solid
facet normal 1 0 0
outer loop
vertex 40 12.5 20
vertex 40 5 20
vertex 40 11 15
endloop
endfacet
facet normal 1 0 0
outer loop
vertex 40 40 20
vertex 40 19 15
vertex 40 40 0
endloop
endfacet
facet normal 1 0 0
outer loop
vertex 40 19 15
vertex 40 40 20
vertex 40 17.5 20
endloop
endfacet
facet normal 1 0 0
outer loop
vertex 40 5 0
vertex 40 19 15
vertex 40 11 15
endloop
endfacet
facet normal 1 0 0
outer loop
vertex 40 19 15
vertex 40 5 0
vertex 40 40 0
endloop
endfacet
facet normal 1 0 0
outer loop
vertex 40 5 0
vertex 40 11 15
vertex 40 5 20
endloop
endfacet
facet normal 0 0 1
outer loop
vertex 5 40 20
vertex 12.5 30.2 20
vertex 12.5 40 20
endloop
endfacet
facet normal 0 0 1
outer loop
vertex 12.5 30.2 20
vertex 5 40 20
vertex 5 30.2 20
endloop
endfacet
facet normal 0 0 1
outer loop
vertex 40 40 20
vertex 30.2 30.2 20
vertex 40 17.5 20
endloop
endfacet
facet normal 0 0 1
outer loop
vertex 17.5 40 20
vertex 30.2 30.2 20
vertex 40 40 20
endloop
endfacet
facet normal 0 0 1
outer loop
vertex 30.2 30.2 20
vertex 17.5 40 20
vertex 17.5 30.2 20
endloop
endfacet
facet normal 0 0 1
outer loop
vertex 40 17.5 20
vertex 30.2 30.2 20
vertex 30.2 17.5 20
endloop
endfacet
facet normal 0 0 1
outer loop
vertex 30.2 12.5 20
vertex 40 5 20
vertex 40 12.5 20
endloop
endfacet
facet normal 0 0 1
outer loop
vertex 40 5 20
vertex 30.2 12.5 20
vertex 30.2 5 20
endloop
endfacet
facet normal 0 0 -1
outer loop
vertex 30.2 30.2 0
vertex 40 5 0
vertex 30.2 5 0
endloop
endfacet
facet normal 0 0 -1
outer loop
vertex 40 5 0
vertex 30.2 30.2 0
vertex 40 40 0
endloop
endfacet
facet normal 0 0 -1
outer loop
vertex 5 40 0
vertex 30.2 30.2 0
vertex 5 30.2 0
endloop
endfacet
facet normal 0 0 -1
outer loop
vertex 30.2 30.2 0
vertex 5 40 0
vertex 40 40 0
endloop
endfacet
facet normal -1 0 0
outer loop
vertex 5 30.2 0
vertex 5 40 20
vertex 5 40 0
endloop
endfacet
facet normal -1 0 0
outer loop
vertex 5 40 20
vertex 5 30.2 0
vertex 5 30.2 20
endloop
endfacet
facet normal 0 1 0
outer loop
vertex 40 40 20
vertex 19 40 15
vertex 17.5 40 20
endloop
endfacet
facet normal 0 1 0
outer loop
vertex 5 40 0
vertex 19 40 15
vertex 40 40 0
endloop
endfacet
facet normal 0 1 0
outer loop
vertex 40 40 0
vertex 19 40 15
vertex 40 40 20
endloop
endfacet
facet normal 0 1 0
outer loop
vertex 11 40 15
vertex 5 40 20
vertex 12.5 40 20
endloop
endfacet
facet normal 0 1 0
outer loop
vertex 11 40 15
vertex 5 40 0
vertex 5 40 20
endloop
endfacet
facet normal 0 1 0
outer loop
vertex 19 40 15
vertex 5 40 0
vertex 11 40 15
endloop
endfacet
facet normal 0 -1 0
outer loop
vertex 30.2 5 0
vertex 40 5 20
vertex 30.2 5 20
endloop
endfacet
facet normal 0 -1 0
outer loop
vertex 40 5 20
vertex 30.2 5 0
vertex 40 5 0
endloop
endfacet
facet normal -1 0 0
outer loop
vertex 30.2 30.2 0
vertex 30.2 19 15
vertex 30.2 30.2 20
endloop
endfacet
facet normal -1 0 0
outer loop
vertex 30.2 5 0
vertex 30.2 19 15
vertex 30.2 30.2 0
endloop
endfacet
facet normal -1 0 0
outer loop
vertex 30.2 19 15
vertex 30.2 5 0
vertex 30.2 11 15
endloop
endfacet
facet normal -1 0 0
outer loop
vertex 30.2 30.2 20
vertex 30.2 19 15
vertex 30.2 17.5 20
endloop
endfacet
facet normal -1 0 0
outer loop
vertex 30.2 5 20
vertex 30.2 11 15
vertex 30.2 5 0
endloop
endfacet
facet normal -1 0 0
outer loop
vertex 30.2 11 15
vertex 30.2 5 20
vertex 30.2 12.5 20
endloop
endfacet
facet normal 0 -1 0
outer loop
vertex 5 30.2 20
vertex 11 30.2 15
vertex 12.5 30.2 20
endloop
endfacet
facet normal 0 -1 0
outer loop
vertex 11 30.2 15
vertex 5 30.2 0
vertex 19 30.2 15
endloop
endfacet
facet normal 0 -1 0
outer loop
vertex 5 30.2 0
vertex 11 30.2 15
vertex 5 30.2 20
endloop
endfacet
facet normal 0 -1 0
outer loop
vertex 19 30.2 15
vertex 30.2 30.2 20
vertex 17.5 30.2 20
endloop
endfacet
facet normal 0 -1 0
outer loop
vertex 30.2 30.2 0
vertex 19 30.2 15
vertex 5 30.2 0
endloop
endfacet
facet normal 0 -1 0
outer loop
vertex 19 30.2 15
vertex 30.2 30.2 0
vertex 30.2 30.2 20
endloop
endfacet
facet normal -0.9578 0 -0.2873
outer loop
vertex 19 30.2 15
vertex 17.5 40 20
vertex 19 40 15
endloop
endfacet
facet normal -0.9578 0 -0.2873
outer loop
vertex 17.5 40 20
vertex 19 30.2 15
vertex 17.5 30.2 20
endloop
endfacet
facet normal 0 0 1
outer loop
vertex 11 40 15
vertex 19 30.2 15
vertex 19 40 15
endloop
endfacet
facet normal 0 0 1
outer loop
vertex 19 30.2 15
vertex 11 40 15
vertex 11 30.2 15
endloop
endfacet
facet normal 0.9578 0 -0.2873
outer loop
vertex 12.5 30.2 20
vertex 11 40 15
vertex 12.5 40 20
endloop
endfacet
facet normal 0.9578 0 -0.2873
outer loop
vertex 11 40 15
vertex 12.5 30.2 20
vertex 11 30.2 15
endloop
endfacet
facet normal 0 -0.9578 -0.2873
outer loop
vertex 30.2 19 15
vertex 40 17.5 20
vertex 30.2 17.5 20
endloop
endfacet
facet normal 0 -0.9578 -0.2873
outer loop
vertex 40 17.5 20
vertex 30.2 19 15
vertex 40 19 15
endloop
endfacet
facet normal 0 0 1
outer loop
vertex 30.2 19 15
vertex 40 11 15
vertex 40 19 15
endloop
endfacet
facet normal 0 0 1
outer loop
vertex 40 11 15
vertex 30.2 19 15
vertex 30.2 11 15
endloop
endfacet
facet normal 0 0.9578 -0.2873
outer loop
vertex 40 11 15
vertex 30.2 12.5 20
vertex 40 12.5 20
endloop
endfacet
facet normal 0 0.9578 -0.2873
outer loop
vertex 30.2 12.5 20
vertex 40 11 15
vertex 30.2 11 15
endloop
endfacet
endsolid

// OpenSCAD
// file: ../../globals.scad
/*
Most things in this file is represented as one millimeter, so keep that in mind while changing things.
Some of the setting are not mm but at variables that you can set, such as 2*x=2x and you are setting what x is.
I will try to specify when things are variables and not exact measurements.
*/

// printer slop, used by snappy parts
slop = 0.15;

//Virindi settings
dovetail_male_width_scale = 0.98;
dovetail_male_height_scale = 0.91;

obj_leg = 30;
leg_length = 5.5;
small_number = 0.001;
metal_core_rode_global = 5;


///////////////// number of holes /////////////////////
z_hole_number = 8;
other_holes = 8;

///////////////// Pins /////////////////////

//pins that poke out
ball_size = 10;
pin_height = 20;
pin_diameter = 6;


//holes
hole_ball_size = ball_size;
hole_pin_height = pin_height;
hole_pin_diameter = pin_diameter;

///////////////// Z THINGS /////////////////////

berring_slot_width = 7.5;
berring_slot_depth = 6.5;
metal_core_rode = 5;

///////////////// X THINGS /////////////////////

//male dove tails
max_width=8;
min_width=5;
depth=5;
height=obj_leg/2;

//female dove tails, this is found on the y mounts
girl_max_width=11;
girl_min_width=5;
girl_depth=5;
girl_height=obj_leg;


///////////////// Y THINGS /////////////////////
/*
The Y is so normal that all of those global variables at the top should change all of the setting in it, this section is set her incase there are variables set in the future development of this project.
*/

// stepper
motor_side_length = 43.2;
motor_bolt_hole_distance = 31;
motor_center_hole = 23;
motor_shaft_dia = 5;
motor_shaft_hole_dia = 5+2*slop;

// bolts etc.
bolt_hole_dia = 3+2*slop;
bolt_head_hole_dia = 5.8;

m3_nut_side = 5.65;

// threaded rod
lifter_rod_diam = 9.86;
hole_threaded_rod = lifter_rod_diam+2*slop;
// file: ../../include.scad
use <globals.scad>

//////////////////      END SECTION       //////////////////

	module added_pins(){
		difference(){
			union(){
				translate([30/(15/4),obj_leg*leg_length,30/(15/4)]) pin();
				translate([30/(15/4)+14.5,obj_leg*leg_length,30/(15/4)+14]) pin();
			}
			union(){
							translate([30/(15/4)+13.5,obj_leg*leg_length-20,30/(15/4)+5])cube(size=[2,40,15]);
							translate([30/(15/4)+7.5,obj_leg*leg_length-20,30/(15/4)+15])rotate([0,90,0]) cube(size=[2,40,15]);	

							translate([30/(15/4)-1,obj_leg*leg_length-20,30/(15/4)-8])cube(size=[2,40,15]);
							translate([30/(15/4)-10,obj_leg*leg_length-20,30/(15/4)+1])rotate([0,90,0]) cube(size=[2,40,15]);
			}
		}
	}
	module taken_pins() {
		translate([30/(15/4)+14,obj_leg*leg_length-10,30/(15/4)]) mirror_pin();
		translate([30/(15/4),obj_leg*leg_length-10,30/(15/4)+15]) mirror_pin();
	}


//////////////////      OTHER STUFF       //////////////////

	module holes() {
		rotate([0,0,90]) for(y=[0:other_holes])
		translate([obj_leg+y*15,-15.5,7.5]) union() {
			translate([7.5,0,15]) hole_up();
			hole_down();
		}
	}
	module extend_holes() {
	module top(){
		rotate([0,0,90]) for(y=[0:other_holes+1])
		translate([(30/4)+y*15,-15.5,7.5]) union() {
			translate([7.5,0,15]) hole_up();
		}
	}
	module bottom(){
		rotate([0,0,90]) for(y=[0:other_holes+2])
		translate([(30/4)+y*15,-15.5,7.5]) union() {
			hole_down();
		
}
	}
	union(){
		top();
		bottom();
	}
	}

	module hole() {
		union() {
			rotate([90, 90, 0]) cylinder(h=40, d=hole_pin_diameter, center=true);
			translate([0,7.5,0]) sphere(d=hole_ball_size);
			translate([0,-6,0]) sphere(d=hole_ball_size);
		}
	}
	module hole_up() {
		union() {
			rotate([90, 90, 0]) cylinder(h=40, d=hole_pin_diameter, center=true);
			translate([0,7.5,10]) cylinder(h=hole_pin_height, d=hole_pin_diameter, center=true);
			translate([0,-6,10]) cylinder(h=hole_pin_height, d=hole_pin_diameter, center=true);
			translate([0,7.5,0]) sphere(d=hole_ball_size);
			translate([0,-6,0]) sphere(d=hole_ball_size);
		}
	}
	module hole_down() {
		union() {
			rotate([90, 90, 0]) cylinder(h=40, d=hole_pin_diameter, center=true);
			translate([0,7.5,-10]) cylinder(h=hole_pin_height, d=hole_pin_diameter, center=true);
			translate([0,-6,-10]) cylinder(h=hole_pin_height, d=hole_pin_diameter, center=true);
			translate([0,7.5,0]) sphere(d=hole_ball_size);
			translate([0,-6,0]) sphere(d=hole_ball_size);
		}
	}
	module pin() {
		union() {
			rotate([90, 90, 0]) cylinder(h=pin_height, d=pin_diameter, center=true);
			translate([0,7.5,0]) sphere(d=ball_size);
		}
	}

	module mirror_pin() {
		rotate([90, 90, 0]) cylinder(h=hole_pin_height+small_number, d=hole_pin_diameter, center=true);
		translate([0,-(pin_height-(ball_size/2)),0]) sphere(d=ball_size);
	}


//////////////////      SOME RACK AND Z THINGS       //////////////////

module z_holes() {
    rotate([0,-90,0]) for(z=[0:z_hole_number])
    translate([22.5+z*15,16,-12])
        hole();
}

module pin_cuts() {
	union(){
		cube(size=[2,10,40], center=true);
		rotate([0,0,90]) cube(size=[2,10,40], center=true);
	}
}
module pin_uncut() {
	union(){
		rotate([0, 0, 90]) cylinder(h=hole_pin_height, d=hole_pin_diameter, center=true);
		translate([0,0,10]) sphere(d=ball_hole);
	}
}


module pin_out() {
	union(){
		rotate([0, 0, 90]) cylinder(h=pin_height, d=pin_diameter, center=true);
		translate([0,0,10]) sphere(d= ball_size);
	}
}


module pins_z(){
	difference() {
		pin_out();
		pin_cuts();
	}
}

module rounded_cube(width,depth,height){
    hull(){
        translate([width/2-diameter/2,depth/2-diameter/2,height/2-diameter/2]) sphere(d=diameter);
        translate([width/2-(diameter/2),depth/2-(diameter/2),-height/2+(diameter/2)]) sphere(d=diameter);
        translate([-width/2+diameter/2,depth/2-diameter/2,height/2-diameter/2]) sphere(d=diameter);
        translate([-width/2+(diameter/2),depth/2-(diameter/2),-height/2+(diameter/2)]) sphere(d=diameter);
        
        translate([width/2-diameter/2,-depth/2+diameter/2,height/2-diameter/2]) sphere(d=diameter);
        translate([width/2-(diameter/2),-depth/2+(diameter/2),-height/2+(diameter/2)]) sphere(d=diameter);
        translate([-width/2+diameter/2,-depth/2+diameter/2,height/2-diameter/2]) sphere(d=diameter);
        translate([-width/2+(diameter/2),-depth/2+(diameter/2),-height/2+(diameter/2)]) sphere(d=diameter);
    }
}

module motor_shaft_hole(h=10) {
    difference() {
        cylinder(d=motor_shaft_hole_dia, h=h);
        translate([0,4.5,h/2]) cube([5,5,h], center=true); 
    }
}
//////////////////      RACK AND SLIDE     ///////////////////

module straight_pins() {
	for(z=[0:((((obj_leg*leg_length)*2)-(obj_leg*2))/3)/14.5]) rotate([-90,0,0]) translate([z*15,30/(15/4),14]) pins_z();
	for(z=[0:((((obj_leg*leg_length)*2)-(obj_leg*2))/3)/14.5]) rotate([-90,0,0]) translate([z*15,30/(15/4)-14,14]) pins_z();
}
module stagger_pins() {
	for(z=[0:((((obj_leg*leg_length)*2)-(obj_leg*2))/3)/14.5]) rotate([-90,0,0]) translate([z*15,30/(15/4),14]) pins_z();
	for(z=[0:((((obj_leg*leg_length)*2)-(obj_leg*2))/3)/14.5]) rotate([-90,0,0]) translate([z*15+7,30/(15/4)-14,14]) pins_z();
}


//////////////////      DOVE TAIL       //////////////////

module male_dovetail(height) {
	dovetail_3d(max_width,min_width,depth,height);
}

module dovetail_3d(max_width=11, min_width=5, depth=5, height=30) {
	linear_extrude(height=height, convexity=2)
		dovetail_2d(max_width,min_width,depth);
}

module dovetail_2d(max_width=11, min_width=5, depth=5) {
	angle=atan((max_width/2-min_width/2)/depth);
	echo("angle: ", angle);
	polygon(paths=[[0,1,2,3,0]], points=[[-min_width/2,0], [-max_width/2,depth], [max_width/2, depth], [min_width/2,0]]);
}

//bow tie
	module tie_end(height){
				rotate([0,0,0]) translate([0,-0.01,((obj_leg/2)/2)]) male_dovetail(height);
				rotate([0,90,0]) translate([0,-0.01,((obj_leg/2)/2)]) male_dovetail(height);
				rotate([0,180,0]) translate([0,-0.01,((obj_leg/2)/2)]) male_dovetail(height);
				rotate([0,-90,0]) translate([0,-0.01,((obj_leg/2)/2)]) male_dovetail(height);
	}

module bow_support(){
	difference(){
		intersection(){
			translate([-15,0,-15]) cube([30,9,30]);
			scale([1.05,1.05,1.05]) rotate([0,45,0]) tie_end();
		}
		cube([29.2,29.2,29.2], center=true);
	}
}

	module wrap(units){
	for (y = [-1:units-2]) // two iterations, z = -1, z = 1
	{
			translate([15, (y*30)+15, 15]){
			for (r = [0:4]) // two iterations, z = -1, z = 1
			{
				rotate([0,r*90,0]) translate([0,15,15]) rotate([-90,0,0])male_dovetail(height=30);
			}
		}
	}
	}
// main file
include <../../include.scad>;
include <../../globals.scad>;

height = 20;

module twist_corner_riser() {
    difference() {
        translate([5,5,0]) cube([35,35,height]);
        cube([30.2,30.2,height]);
        translate([15,30,height]) #rotate([-90,0,0]) male_dovetail(height=10);
        translate([40,15,height]) #rotate([-90,0,90]) male_dovetail(height=10);
    }
}

twist_corner_riser();
